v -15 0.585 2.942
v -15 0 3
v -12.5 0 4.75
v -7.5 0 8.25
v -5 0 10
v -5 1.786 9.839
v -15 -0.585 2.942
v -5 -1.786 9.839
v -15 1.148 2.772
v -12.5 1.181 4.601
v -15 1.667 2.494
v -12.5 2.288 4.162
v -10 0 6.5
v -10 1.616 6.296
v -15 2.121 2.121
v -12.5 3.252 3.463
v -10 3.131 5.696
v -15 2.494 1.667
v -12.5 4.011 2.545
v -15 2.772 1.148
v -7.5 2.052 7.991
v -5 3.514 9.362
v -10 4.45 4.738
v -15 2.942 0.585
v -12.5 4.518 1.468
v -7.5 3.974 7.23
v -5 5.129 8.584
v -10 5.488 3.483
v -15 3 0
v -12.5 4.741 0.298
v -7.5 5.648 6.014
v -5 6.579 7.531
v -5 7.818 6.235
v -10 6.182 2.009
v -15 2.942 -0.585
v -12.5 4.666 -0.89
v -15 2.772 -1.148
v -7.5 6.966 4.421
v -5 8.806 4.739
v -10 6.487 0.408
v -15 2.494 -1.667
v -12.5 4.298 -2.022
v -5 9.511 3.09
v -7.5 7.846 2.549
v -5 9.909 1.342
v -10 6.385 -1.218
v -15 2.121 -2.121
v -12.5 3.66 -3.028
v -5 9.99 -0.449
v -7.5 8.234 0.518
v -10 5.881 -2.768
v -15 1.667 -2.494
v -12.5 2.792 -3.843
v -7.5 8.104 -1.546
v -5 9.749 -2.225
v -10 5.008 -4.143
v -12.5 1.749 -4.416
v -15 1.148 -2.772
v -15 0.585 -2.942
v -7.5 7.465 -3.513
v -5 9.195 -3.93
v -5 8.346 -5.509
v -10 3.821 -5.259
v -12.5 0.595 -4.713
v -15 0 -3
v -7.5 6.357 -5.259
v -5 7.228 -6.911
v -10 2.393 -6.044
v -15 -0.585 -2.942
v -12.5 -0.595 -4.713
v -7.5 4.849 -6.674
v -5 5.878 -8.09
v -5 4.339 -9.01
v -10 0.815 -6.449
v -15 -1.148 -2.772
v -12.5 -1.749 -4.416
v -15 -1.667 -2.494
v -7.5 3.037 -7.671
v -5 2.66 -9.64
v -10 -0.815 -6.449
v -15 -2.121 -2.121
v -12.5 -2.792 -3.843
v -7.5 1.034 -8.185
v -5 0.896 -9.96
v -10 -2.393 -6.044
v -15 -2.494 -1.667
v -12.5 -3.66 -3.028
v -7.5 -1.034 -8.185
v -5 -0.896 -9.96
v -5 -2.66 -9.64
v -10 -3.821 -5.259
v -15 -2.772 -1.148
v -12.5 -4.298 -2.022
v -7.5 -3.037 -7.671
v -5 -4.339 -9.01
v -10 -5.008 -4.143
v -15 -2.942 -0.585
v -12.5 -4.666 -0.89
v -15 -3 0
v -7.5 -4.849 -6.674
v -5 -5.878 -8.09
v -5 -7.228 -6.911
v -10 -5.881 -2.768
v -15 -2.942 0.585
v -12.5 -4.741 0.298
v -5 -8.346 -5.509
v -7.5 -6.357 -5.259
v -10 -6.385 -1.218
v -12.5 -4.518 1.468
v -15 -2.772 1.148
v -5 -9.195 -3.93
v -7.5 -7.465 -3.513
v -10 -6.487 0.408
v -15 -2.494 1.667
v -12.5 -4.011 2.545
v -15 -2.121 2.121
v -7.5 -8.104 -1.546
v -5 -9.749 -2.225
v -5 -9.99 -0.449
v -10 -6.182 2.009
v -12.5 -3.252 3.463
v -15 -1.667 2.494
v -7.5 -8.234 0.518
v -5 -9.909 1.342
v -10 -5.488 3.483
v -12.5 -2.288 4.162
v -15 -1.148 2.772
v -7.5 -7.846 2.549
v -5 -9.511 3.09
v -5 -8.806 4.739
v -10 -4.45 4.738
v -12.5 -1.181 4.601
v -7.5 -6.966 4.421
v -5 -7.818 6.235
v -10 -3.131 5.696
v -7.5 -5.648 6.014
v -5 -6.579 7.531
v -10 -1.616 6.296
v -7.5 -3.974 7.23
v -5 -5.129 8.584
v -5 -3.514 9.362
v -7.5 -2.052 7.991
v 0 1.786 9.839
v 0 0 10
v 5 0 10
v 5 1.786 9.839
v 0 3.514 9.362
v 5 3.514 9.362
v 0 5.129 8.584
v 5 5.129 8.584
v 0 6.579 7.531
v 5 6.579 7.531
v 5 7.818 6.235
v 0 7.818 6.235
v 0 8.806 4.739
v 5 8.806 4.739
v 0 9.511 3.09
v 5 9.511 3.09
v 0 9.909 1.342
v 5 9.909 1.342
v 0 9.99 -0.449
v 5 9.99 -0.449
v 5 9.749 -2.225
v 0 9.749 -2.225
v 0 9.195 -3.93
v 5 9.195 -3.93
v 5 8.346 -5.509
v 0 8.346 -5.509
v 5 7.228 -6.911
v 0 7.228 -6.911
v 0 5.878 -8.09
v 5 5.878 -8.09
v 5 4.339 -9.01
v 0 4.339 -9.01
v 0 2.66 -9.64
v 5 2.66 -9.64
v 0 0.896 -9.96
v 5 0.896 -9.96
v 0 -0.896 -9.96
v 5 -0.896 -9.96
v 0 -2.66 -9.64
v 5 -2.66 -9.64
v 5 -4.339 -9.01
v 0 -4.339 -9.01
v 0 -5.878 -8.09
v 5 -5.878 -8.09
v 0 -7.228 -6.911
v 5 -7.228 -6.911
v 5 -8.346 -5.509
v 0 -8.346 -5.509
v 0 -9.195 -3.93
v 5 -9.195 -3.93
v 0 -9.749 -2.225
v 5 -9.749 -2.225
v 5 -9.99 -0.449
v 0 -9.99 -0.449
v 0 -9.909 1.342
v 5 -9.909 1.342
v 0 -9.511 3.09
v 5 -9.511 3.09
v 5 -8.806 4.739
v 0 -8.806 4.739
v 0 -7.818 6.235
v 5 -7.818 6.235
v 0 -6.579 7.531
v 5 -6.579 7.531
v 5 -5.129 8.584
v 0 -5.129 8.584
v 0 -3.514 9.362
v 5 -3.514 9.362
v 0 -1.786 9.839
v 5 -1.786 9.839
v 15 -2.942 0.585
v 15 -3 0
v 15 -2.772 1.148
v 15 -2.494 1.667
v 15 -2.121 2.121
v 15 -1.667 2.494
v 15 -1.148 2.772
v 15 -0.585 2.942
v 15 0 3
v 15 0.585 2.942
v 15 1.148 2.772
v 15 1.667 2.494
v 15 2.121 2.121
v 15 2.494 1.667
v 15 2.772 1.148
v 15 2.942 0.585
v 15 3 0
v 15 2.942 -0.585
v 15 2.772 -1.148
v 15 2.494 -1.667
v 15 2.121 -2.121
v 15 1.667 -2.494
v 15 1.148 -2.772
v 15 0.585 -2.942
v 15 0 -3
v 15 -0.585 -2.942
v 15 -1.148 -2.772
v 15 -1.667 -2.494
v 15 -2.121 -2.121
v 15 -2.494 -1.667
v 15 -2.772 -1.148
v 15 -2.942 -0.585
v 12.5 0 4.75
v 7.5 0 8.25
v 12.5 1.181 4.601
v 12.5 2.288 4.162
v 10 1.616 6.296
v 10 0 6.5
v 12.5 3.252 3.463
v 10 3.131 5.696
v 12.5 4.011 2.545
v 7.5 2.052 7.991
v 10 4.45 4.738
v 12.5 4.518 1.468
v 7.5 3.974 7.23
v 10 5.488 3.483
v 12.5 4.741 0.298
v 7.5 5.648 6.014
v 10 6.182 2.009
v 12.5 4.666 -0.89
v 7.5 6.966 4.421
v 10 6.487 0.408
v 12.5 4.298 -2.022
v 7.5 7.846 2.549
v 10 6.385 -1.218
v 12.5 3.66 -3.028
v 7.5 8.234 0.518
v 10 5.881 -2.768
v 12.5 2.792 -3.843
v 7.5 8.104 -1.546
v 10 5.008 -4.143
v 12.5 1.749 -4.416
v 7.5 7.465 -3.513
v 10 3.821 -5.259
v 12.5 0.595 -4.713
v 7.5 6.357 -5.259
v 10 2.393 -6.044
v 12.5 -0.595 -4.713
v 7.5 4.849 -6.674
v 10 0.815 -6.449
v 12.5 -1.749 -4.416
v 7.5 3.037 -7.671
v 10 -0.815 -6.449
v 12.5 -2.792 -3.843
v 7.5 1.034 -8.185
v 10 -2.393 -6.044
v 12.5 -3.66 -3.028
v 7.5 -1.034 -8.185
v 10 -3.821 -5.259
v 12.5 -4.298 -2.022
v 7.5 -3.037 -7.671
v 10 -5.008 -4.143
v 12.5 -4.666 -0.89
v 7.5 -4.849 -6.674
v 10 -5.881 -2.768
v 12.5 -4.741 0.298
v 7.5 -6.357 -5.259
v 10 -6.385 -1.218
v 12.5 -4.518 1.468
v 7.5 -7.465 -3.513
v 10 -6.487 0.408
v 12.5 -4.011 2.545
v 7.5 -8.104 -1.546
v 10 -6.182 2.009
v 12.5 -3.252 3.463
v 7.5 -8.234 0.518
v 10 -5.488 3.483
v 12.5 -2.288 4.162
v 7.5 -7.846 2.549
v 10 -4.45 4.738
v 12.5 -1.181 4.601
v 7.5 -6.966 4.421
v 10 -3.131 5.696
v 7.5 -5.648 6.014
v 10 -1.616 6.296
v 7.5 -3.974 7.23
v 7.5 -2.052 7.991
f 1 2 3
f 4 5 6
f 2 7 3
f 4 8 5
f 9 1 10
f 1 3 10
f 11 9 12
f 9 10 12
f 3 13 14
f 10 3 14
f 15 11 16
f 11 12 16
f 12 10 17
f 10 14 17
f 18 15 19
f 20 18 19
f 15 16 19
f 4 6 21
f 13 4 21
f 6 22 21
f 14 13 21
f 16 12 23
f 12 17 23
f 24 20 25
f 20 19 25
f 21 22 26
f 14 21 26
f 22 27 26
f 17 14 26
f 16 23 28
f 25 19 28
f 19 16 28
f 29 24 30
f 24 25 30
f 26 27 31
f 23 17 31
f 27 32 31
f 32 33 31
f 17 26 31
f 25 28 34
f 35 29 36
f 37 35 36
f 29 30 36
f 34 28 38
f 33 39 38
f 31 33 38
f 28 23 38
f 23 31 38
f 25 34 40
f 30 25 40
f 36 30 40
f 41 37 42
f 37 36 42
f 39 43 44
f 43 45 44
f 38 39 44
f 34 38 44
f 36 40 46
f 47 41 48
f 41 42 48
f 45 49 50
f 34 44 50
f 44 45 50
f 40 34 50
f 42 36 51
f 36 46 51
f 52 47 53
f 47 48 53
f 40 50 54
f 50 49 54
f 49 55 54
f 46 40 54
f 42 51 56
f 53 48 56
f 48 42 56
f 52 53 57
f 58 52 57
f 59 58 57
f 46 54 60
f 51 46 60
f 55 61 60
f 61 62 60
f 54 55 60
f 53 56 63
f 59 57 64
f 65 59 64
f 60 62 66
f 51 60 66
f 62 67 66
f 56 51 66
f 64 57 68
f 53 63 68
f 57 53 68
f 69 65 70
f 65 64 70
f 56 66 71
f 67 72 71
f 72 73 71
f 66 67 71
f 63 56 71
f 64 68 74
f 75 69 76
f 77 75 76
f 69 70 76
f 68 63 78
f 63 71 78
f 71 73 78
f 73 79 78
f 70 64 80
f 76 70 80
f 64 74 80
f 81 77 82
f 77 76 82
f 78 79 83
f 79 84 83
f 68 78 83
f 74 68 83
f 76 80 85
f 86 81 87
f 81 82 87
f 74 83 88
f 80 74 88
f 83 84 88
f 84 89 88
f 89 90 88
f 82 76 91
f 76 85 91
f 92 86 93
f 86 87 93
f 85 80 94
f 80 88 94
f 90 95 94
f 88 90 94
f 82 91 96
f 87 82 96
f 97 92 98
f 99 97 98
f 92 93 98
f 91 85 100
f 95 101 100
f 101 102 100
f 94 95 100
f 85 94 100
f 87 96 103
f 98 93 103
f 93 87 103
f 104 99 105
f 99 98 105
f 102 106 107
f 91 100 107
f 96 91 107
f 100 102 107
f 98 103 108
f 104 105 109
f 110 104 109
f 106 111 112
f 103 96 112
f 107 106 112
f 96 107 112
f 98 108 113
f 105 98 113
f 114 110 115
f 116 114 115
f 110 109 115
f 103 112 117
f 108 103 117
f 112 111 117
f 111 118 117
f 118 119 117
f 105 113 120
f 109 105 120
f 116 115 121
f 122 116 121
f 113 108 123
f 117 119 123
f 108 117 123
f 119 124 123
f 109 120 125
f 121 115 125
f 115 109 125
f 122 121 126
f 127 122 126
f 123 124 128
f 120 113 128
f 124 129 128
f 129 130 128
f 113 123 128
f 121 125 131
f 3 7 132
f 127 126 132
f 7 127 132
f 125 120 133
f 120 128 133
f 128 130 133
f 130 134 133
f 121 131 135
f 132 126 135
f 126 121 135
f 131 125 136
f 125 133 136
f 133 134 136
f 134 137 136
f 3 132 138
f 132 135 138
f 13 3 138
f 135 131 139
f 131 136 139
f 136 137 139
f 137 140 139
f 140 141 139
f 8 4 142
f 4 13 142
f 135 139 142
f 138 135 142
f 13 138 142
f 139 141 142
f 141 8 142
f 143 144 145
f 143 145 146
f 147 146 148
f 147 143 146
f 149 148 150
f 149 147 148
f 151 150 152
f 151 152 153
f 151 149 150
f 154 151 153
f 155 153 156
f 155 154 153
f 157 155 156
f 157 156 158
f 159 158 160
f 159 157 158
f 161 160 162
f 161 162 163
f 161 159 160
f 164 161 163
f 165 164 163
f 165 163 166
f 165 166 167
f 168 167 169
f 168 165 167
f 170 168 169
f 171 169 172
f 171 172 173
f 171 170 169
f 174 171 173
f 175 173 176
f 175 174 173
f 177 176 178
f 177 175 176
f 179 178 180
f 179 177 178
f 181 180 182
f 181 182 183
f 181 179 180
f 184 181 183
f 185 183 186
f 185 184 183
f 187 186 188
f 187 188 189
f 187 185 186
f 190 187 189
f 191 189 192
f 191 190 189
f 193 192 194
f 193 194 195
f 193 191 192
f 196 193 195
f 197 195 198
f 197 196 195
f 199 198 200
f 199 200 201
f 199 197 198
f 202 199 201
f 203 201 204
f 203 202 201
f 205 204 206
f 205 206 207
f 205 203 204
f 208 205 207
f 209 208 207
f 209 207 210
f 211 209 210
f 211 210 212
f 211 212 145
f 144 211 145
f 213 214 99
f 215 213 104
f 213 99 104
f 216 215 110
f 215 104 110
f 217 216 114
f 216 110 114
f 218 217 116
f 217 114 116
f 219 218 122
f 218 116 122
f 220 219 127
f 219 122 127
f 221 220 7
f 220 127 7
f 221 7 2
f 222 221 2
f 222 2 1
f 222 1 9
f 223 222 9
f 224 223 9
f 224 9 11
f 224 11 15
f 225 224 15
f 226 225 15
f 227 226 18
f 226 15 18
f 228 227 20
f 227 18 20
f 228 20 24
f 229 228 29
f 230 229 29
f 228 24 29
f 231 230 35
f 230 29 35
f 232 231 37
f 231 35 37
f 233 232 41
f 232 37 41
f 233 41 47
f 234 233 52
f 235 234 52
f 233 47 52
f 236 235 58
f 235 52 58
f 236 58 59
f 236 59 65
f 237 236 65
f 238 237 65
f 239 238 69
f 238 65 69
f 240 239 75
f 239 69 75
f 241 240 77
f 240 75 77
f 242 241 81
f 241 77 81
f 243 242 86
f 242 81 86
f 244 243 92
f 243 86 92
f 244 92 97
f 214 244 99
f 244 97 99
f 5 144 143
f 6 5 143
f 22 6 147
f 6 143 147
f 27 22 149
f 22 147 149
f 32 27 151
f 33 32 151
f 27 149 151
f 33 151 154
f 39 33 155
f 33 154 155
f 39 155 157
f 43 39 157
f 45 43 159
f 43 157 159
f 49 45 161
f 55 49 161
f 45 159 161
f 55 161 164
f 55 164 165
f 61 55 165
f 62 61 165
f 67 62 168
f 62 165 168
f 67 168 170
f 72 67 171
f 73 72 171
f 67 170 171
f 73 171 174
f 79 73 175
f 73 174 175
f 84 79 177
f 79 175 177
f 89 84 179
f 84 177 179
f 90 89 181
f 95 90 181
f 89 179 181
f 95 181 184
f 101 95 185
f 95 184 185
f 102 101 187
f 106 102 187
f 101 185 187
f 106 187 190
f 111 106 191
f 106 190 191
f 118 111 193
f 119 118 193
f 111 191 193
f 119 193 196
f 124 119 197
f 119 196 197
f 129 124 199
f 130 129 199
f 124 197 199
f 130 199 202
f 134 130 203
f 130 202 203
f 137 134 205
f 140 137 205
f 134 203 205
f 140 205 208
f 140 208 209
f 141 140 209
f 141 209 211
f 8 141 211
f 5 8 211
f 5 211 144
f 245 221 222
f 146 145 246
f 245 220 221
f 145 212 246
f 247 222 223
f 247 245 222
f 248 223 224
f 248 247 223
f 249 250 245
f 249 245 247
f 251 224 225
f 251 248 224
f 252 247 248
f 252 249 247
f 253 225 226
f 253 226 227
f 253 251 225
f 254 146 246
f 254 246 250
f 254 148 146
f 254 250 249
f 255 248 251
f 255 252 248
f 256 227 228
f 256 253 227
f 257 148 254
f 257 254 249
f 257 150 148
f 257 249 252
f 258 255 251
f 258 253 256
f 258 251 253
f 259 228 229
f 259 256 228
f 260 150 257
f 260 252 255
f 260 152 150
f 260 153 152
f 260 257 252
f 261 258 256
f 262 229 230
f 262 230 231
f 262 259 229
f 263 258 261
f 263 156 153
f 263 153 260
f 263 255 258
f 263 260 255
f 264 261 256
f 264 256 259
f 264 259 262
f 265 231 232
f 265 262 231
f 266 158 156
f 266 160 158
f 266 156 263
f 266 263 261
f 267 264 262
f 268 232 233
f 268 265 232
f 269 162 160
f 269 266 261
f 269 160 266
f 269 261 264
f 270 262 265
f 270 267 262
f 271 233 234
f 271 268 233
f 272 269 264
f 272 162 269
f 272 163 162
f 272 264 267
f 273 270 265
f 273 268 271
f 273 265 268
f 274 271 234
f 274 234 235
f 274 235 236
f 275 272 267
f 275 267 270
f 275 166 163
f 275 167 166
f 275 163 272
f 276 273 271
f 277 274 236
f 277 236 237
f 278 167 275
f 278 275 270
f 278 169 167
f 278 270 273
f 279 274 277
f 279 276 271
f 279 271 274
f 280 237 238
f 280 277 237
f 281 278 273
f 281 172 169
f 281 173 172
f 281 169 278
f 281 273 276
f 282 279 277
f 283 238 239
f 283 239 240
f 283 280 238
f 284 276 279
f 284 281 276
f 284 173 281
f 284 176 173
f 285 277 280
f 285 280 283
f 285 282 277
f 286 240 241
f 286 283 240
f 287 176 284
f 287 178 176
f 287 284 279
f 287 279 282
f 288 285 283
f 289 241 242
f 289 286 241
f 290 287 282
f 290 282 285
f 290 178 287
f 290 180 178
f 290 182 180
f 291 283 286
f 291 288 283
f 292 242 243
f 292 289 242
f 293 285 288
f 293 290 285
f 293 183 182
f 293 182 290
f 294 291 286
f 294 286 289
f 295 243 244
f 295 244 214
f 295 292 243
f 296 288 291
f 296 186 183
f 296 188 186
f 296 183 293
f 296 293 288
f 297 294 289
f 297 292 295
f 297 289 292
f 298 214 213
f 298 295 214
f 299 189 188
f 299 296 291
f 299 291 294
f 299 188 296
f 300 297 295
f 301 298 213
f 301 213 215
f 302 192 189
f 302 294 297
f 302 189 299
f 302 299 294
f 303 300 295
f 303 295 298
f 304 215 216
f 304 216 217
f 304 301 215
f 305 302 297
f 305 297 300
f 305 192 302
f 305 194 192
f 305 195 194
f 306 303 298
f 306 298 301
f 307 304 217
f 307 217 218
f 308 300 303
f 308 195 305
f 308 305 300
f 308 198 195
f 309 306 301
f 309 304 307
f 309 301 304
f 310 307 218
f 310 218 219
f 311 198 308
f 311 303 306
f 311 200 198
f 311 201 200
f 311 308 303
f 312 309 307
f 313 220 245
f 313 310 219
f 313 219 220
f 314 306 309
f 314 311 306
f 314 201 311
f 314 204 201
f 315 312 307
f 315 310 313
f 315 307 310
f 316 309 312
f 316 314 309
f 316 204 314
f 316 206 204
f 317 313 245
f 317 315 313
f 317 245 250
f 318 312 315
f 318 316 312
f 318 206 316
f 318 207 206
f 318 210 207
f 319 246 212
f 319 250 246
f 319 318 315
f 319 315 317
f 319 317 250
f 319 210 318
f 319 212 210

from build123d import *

# Parameters (mm, degrees)
F3_R     = 3
F4_DEPTH = 30.001


with BuildPart() as f1:
    # F0 (on Front) → F1 (revolve)
    with BuildSketch(Plane.XZ):
        Polygon((0, 10), (0, 0), (15, 0), (15, 3), (5, 10), align=None)
    revolve(axis=Axis((7.5, 0, 0), (-1, 0, 0)))

    # F2: F1 across plane


with BuildPart() as f1_1:
    add(f1.part)
    add(f1.part.mirror(Plane.YZ))

    # F3 (on face) → F4 (cut, through all)
    with BuildSketch(Plane(origin=(-15, 0, 0), x_dir=(0, -1, 0), z_dir=(-1, 0, 0))):
        Circle(F3_R)
    extrude(amount=-F4_DEPTH, mode=Mode.SUBTRACT)


solid = f1_1.part
